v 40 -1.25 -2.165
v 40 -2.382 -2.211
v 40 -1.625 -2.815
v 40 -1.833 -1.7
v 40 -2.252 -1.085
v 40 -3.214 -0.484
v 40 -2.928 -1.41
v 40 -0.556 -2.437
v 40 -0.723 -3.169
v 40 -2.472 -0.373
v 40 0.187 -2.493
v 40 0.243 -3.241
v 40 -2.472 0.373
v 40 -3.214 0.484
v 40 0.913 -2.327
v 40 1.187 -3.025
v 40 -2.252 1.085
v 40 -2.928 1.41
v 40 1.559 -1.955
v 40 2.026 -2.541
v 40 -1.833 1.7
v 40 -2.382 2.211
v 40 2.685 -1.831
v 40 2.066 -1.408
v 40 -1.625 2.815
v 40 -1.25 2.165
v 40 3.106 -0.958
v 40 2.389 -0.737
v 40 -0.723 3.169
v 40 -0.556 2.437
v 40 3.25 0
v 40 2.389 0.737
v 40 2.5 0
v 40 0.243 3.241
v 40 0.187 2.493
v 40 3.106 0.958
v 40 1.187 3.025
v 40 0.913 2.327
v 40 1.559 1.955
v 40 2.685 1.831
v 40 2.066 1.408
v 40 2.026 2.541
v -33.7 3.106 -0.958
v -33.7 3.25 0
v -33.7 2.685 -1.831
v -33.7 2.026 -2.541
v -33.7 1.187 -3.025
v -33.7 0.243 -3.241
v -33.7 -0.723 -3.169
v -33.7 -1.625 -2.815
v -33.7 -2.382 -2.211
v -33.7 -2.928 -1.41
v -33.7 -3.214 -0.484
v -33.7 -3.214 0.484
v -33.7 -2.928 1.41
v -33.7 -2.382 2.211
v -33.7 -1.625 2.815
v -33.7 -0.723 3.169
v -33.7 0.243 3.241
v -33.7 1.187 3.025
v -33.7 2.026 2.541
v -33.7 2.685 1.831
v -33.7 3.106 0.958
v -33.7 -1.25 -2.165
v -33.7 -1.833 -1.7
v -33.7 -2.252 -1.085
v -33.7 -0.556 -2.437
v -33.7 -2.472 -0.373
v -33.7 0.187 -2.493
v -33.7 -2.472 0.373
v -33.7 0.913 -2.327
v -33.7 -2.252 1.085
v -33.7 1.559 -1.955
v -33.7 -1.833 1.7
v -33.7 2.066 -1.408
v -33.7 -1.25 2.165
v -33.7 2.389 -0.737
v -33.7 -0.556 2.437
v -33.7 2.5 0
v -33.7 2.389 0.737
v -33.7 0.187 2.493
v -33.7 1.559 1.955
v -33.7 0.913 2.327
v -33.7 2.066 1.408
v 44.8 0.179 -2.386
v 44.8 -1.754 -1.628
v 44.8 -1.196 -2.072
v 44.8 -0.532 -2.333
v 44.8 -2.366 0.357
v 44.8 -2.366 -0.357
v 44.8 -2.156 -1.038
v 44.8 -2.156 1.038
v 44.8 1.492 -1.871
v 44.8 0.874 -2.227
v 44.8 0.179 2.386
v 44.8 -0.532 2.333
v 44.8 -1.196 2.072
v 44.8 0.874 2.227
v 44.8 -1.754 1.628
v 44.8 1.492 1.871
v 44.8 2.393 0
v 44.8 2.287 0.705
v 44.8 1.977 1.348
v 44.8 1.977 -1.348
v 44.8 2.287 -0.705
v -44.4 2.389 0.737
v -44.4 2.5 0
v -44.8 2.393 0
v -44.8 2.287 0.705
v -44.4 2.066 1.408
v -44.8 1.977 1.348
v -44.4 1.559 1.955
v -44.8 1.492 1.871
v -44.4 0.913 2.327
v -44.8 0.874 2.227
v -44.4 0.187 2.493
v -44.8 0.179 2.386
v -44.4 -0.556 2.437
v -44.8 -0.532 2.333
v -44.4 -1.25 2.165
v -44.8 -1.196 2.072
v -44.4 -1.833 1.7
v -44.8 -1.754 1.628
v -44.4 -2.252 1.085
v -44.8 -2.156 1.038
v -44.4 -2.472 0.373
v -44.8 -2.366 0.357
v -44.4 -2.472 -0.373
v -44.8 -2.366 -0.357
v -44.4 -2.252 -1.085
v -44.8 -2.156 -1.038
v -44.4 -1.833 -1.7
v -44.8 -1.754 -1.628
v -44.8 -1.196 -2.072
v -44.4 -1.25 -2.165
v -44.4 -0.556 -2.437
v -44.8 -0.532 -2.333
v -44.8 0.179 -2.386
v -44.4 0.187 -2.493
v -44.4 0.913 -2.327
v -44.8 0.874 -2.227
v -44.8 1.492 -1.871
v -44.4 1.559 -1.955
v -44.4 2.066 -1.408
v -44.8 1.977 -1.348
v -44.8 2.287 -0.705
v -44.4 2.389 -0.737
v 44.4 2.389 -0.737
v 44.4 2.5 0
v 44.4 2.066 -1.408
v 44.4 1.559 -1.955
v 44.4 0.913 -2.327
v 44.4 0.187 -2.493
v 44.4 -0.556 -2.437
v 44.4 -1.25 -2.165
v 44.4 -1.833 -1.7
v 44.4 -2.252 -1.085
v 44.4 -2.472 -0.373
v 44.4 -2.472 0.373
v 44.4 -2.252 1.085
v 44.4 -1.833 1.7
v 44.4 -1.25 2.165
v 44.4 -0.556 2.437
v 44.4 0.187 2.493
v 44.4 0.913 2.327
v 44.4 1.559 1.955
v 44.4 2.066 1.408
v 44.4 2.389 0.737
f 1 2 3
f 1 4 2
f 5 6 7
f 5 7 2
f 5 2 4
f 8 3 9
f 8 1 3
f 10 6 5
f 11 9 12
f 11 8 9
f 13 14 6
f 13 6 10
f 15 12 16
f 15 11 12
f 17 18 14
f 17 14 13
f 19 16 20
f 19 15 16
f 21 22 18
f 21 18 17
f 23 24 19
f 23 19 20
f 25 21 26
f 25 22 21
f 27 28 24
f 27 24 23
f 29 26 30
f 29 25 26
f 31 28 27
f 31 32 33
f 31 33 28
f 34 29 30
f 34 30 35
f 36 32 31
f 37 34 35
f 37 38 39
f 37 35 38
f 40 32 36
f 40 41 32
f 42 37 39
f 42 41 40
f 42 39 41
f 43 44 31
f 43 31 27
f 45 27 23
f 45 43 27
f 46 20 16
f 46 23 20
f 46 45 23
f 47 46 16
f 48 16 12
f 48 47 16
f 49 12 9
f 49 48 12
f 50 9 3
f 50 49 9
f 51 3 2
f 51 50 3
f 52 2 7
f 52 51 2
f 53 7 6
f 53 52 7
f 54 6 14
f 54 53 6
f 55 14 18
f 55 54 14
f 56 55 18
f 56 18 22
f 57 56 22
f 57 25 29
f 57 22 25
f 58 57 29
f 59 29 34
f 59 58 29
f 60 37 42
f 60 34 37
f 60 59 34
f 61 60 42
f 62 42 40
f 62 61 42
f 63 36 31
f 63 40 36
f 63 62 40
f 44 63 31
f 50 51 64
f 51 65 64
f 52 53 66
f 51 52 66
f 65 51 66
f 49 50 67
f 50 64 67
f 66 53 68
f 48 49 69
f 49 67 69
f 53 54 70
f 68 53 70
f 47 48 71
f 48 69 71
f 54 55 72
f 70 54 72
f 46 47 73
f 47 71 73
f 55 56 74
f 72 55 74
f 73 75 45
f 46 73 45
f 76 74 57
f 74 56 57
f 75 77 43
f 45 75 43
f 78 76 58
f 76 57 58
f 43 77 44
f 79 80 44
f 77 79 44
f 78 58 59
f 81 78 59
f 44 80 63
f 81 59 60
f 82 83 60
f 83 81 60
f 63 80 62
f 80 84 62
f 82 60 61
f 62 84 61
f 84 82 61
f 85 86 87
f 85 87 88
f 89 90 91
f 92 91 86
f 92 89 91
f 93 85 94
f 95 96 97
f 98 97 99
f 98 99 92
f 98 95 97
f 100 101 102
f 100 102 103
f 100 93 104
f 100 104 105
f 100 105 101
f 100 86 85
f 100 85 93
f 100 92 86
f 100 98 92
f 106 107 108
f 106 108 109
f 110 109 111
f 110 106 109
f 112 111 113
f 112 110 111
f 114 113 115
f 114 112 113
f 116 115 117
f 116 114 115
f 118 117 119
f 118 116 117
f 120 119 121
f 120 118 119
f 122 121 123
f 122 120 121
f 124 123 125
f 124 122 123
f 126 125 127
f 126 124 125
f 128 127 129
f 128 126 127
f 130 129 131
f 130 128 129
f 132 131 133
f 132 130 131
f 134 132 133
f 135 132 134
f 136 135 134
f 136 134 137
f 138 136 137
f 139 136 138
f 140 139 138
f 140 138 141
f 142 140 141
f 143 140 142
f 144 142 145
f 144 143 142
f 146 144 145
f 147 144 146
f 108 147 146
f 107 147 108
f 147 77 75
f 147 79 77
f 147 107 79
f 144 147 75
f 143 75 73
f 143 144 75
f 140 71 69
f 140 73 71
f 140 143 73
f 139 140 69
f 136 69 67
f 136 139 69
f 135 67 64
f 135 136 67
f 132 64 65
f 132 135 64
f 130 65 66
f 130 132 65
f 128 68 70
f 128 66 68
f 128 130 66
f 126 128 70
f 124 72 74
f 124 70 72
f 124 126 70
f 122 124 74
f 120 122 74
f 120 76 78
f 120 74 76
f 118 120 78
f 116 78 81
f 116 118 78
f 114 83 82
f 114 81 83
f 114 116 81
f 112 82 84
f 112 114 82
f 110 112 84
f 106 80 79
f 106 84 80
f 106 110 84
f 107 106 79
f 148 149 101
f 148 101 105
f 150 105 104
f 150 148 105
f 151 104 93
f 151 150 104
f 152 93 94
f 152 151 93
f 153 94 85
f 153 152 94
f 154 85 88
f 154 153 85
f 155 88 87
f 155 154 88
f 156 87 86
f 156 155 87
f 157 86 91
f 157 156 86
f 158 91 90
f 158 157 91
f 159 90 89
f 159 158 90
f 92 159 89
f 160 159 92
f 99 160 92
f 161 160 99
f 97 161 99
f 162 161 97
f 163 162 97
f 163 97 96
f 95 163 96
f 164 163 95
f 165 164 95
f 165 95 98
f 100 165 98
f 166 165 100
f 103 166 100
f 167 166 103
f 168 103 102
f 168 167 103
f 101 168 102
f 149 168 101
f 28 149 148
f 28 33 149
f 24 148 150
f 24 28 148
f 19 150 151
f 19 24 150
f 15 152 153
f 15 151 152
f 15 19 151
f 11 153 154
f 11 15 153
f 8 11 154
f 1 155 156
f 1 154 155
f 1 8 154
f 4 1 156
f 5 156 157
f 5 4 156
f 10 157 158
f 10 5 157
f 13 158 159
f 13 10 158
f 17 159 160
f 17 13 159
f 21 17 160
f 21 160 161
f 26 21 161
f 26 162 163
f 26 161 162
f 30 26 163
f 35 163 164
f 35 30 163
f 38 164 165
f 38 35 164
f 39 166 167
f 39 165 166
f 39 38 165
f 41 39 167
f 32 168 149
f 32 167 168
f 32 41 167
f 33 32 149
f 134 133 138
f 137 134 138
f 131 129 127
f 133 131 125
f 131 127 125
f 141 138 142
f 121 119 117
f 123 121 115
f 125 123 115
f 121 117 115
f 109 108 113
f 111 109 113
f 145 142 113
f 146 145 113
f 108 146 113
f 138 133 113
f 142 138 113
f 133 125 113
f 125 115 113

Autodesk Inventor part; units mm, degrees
ref_plane "YZ Plane" through (0, 0, 0) normal (1, 0, 0) x (0, 1, 0)
ref_plane "XZ Plane" through (0, 0, 0) normal (0, 1, 0) x (-1, 0, 0)
ref_plane "XY Plane" through (0, 0, 0) normal (0, 0, 1) x (1, 0, 0)
sketch "Skizze1" plane through (0, 0, 0) normal (0, 0, 1) x (1, 0, 0)
  line L0 (-44.8, 0) -> (44.8, 0)
  line L1 (44.8, 0) -> (44.8, 2.5)
  line L2 (44.8, 2.5) -> (40, 2.5)
  line L3 (40, 2.5) -> (40, 3.25)
  line L4 (40, 3.25) -> (-33.7, 3.25)
  line L5 (-33.7, 3.25) -> (-33.7, 2.5)
  line L6 (-33.7, 2.5) -> (-44.8, 2.5)
  line L7 (-44.8, 2.5) -> (-44.8, 0)
  line L8 (0, 3.9) -> (0, -0.65) projected
  line L9 (-39.8, 2.5) -> (-39.8, 0) construction
  point P0 (0, 0)
  dimension "d1" = 4.8
  dimension "d2" = 5
  dimension "d4" = 6.5
  dimension "d18" = 5
  dimension "d20" = 79.8
  dimension "d22" = 6.1
  dimension "d23" = 5
revolve "Umdrehung1" add sketch "Skizze1" angle 360 about axis through (-44.8, 0, 0) along (1, 0, 0)
chamfer "Fase2" distance 0.4 angle 15 1 edges at (-44.8, -2.5, 0) measured on face at (-41.1, 2.4919, -0.2012)
chamfer "Fase3" distance 0.4 angle 15 1 edges at (44.8, -2.5, 0) measured on face at (41.6, 2.4919, -0.2012)
properties part number "Dribblingwelle" material "Aluminium 6061"
